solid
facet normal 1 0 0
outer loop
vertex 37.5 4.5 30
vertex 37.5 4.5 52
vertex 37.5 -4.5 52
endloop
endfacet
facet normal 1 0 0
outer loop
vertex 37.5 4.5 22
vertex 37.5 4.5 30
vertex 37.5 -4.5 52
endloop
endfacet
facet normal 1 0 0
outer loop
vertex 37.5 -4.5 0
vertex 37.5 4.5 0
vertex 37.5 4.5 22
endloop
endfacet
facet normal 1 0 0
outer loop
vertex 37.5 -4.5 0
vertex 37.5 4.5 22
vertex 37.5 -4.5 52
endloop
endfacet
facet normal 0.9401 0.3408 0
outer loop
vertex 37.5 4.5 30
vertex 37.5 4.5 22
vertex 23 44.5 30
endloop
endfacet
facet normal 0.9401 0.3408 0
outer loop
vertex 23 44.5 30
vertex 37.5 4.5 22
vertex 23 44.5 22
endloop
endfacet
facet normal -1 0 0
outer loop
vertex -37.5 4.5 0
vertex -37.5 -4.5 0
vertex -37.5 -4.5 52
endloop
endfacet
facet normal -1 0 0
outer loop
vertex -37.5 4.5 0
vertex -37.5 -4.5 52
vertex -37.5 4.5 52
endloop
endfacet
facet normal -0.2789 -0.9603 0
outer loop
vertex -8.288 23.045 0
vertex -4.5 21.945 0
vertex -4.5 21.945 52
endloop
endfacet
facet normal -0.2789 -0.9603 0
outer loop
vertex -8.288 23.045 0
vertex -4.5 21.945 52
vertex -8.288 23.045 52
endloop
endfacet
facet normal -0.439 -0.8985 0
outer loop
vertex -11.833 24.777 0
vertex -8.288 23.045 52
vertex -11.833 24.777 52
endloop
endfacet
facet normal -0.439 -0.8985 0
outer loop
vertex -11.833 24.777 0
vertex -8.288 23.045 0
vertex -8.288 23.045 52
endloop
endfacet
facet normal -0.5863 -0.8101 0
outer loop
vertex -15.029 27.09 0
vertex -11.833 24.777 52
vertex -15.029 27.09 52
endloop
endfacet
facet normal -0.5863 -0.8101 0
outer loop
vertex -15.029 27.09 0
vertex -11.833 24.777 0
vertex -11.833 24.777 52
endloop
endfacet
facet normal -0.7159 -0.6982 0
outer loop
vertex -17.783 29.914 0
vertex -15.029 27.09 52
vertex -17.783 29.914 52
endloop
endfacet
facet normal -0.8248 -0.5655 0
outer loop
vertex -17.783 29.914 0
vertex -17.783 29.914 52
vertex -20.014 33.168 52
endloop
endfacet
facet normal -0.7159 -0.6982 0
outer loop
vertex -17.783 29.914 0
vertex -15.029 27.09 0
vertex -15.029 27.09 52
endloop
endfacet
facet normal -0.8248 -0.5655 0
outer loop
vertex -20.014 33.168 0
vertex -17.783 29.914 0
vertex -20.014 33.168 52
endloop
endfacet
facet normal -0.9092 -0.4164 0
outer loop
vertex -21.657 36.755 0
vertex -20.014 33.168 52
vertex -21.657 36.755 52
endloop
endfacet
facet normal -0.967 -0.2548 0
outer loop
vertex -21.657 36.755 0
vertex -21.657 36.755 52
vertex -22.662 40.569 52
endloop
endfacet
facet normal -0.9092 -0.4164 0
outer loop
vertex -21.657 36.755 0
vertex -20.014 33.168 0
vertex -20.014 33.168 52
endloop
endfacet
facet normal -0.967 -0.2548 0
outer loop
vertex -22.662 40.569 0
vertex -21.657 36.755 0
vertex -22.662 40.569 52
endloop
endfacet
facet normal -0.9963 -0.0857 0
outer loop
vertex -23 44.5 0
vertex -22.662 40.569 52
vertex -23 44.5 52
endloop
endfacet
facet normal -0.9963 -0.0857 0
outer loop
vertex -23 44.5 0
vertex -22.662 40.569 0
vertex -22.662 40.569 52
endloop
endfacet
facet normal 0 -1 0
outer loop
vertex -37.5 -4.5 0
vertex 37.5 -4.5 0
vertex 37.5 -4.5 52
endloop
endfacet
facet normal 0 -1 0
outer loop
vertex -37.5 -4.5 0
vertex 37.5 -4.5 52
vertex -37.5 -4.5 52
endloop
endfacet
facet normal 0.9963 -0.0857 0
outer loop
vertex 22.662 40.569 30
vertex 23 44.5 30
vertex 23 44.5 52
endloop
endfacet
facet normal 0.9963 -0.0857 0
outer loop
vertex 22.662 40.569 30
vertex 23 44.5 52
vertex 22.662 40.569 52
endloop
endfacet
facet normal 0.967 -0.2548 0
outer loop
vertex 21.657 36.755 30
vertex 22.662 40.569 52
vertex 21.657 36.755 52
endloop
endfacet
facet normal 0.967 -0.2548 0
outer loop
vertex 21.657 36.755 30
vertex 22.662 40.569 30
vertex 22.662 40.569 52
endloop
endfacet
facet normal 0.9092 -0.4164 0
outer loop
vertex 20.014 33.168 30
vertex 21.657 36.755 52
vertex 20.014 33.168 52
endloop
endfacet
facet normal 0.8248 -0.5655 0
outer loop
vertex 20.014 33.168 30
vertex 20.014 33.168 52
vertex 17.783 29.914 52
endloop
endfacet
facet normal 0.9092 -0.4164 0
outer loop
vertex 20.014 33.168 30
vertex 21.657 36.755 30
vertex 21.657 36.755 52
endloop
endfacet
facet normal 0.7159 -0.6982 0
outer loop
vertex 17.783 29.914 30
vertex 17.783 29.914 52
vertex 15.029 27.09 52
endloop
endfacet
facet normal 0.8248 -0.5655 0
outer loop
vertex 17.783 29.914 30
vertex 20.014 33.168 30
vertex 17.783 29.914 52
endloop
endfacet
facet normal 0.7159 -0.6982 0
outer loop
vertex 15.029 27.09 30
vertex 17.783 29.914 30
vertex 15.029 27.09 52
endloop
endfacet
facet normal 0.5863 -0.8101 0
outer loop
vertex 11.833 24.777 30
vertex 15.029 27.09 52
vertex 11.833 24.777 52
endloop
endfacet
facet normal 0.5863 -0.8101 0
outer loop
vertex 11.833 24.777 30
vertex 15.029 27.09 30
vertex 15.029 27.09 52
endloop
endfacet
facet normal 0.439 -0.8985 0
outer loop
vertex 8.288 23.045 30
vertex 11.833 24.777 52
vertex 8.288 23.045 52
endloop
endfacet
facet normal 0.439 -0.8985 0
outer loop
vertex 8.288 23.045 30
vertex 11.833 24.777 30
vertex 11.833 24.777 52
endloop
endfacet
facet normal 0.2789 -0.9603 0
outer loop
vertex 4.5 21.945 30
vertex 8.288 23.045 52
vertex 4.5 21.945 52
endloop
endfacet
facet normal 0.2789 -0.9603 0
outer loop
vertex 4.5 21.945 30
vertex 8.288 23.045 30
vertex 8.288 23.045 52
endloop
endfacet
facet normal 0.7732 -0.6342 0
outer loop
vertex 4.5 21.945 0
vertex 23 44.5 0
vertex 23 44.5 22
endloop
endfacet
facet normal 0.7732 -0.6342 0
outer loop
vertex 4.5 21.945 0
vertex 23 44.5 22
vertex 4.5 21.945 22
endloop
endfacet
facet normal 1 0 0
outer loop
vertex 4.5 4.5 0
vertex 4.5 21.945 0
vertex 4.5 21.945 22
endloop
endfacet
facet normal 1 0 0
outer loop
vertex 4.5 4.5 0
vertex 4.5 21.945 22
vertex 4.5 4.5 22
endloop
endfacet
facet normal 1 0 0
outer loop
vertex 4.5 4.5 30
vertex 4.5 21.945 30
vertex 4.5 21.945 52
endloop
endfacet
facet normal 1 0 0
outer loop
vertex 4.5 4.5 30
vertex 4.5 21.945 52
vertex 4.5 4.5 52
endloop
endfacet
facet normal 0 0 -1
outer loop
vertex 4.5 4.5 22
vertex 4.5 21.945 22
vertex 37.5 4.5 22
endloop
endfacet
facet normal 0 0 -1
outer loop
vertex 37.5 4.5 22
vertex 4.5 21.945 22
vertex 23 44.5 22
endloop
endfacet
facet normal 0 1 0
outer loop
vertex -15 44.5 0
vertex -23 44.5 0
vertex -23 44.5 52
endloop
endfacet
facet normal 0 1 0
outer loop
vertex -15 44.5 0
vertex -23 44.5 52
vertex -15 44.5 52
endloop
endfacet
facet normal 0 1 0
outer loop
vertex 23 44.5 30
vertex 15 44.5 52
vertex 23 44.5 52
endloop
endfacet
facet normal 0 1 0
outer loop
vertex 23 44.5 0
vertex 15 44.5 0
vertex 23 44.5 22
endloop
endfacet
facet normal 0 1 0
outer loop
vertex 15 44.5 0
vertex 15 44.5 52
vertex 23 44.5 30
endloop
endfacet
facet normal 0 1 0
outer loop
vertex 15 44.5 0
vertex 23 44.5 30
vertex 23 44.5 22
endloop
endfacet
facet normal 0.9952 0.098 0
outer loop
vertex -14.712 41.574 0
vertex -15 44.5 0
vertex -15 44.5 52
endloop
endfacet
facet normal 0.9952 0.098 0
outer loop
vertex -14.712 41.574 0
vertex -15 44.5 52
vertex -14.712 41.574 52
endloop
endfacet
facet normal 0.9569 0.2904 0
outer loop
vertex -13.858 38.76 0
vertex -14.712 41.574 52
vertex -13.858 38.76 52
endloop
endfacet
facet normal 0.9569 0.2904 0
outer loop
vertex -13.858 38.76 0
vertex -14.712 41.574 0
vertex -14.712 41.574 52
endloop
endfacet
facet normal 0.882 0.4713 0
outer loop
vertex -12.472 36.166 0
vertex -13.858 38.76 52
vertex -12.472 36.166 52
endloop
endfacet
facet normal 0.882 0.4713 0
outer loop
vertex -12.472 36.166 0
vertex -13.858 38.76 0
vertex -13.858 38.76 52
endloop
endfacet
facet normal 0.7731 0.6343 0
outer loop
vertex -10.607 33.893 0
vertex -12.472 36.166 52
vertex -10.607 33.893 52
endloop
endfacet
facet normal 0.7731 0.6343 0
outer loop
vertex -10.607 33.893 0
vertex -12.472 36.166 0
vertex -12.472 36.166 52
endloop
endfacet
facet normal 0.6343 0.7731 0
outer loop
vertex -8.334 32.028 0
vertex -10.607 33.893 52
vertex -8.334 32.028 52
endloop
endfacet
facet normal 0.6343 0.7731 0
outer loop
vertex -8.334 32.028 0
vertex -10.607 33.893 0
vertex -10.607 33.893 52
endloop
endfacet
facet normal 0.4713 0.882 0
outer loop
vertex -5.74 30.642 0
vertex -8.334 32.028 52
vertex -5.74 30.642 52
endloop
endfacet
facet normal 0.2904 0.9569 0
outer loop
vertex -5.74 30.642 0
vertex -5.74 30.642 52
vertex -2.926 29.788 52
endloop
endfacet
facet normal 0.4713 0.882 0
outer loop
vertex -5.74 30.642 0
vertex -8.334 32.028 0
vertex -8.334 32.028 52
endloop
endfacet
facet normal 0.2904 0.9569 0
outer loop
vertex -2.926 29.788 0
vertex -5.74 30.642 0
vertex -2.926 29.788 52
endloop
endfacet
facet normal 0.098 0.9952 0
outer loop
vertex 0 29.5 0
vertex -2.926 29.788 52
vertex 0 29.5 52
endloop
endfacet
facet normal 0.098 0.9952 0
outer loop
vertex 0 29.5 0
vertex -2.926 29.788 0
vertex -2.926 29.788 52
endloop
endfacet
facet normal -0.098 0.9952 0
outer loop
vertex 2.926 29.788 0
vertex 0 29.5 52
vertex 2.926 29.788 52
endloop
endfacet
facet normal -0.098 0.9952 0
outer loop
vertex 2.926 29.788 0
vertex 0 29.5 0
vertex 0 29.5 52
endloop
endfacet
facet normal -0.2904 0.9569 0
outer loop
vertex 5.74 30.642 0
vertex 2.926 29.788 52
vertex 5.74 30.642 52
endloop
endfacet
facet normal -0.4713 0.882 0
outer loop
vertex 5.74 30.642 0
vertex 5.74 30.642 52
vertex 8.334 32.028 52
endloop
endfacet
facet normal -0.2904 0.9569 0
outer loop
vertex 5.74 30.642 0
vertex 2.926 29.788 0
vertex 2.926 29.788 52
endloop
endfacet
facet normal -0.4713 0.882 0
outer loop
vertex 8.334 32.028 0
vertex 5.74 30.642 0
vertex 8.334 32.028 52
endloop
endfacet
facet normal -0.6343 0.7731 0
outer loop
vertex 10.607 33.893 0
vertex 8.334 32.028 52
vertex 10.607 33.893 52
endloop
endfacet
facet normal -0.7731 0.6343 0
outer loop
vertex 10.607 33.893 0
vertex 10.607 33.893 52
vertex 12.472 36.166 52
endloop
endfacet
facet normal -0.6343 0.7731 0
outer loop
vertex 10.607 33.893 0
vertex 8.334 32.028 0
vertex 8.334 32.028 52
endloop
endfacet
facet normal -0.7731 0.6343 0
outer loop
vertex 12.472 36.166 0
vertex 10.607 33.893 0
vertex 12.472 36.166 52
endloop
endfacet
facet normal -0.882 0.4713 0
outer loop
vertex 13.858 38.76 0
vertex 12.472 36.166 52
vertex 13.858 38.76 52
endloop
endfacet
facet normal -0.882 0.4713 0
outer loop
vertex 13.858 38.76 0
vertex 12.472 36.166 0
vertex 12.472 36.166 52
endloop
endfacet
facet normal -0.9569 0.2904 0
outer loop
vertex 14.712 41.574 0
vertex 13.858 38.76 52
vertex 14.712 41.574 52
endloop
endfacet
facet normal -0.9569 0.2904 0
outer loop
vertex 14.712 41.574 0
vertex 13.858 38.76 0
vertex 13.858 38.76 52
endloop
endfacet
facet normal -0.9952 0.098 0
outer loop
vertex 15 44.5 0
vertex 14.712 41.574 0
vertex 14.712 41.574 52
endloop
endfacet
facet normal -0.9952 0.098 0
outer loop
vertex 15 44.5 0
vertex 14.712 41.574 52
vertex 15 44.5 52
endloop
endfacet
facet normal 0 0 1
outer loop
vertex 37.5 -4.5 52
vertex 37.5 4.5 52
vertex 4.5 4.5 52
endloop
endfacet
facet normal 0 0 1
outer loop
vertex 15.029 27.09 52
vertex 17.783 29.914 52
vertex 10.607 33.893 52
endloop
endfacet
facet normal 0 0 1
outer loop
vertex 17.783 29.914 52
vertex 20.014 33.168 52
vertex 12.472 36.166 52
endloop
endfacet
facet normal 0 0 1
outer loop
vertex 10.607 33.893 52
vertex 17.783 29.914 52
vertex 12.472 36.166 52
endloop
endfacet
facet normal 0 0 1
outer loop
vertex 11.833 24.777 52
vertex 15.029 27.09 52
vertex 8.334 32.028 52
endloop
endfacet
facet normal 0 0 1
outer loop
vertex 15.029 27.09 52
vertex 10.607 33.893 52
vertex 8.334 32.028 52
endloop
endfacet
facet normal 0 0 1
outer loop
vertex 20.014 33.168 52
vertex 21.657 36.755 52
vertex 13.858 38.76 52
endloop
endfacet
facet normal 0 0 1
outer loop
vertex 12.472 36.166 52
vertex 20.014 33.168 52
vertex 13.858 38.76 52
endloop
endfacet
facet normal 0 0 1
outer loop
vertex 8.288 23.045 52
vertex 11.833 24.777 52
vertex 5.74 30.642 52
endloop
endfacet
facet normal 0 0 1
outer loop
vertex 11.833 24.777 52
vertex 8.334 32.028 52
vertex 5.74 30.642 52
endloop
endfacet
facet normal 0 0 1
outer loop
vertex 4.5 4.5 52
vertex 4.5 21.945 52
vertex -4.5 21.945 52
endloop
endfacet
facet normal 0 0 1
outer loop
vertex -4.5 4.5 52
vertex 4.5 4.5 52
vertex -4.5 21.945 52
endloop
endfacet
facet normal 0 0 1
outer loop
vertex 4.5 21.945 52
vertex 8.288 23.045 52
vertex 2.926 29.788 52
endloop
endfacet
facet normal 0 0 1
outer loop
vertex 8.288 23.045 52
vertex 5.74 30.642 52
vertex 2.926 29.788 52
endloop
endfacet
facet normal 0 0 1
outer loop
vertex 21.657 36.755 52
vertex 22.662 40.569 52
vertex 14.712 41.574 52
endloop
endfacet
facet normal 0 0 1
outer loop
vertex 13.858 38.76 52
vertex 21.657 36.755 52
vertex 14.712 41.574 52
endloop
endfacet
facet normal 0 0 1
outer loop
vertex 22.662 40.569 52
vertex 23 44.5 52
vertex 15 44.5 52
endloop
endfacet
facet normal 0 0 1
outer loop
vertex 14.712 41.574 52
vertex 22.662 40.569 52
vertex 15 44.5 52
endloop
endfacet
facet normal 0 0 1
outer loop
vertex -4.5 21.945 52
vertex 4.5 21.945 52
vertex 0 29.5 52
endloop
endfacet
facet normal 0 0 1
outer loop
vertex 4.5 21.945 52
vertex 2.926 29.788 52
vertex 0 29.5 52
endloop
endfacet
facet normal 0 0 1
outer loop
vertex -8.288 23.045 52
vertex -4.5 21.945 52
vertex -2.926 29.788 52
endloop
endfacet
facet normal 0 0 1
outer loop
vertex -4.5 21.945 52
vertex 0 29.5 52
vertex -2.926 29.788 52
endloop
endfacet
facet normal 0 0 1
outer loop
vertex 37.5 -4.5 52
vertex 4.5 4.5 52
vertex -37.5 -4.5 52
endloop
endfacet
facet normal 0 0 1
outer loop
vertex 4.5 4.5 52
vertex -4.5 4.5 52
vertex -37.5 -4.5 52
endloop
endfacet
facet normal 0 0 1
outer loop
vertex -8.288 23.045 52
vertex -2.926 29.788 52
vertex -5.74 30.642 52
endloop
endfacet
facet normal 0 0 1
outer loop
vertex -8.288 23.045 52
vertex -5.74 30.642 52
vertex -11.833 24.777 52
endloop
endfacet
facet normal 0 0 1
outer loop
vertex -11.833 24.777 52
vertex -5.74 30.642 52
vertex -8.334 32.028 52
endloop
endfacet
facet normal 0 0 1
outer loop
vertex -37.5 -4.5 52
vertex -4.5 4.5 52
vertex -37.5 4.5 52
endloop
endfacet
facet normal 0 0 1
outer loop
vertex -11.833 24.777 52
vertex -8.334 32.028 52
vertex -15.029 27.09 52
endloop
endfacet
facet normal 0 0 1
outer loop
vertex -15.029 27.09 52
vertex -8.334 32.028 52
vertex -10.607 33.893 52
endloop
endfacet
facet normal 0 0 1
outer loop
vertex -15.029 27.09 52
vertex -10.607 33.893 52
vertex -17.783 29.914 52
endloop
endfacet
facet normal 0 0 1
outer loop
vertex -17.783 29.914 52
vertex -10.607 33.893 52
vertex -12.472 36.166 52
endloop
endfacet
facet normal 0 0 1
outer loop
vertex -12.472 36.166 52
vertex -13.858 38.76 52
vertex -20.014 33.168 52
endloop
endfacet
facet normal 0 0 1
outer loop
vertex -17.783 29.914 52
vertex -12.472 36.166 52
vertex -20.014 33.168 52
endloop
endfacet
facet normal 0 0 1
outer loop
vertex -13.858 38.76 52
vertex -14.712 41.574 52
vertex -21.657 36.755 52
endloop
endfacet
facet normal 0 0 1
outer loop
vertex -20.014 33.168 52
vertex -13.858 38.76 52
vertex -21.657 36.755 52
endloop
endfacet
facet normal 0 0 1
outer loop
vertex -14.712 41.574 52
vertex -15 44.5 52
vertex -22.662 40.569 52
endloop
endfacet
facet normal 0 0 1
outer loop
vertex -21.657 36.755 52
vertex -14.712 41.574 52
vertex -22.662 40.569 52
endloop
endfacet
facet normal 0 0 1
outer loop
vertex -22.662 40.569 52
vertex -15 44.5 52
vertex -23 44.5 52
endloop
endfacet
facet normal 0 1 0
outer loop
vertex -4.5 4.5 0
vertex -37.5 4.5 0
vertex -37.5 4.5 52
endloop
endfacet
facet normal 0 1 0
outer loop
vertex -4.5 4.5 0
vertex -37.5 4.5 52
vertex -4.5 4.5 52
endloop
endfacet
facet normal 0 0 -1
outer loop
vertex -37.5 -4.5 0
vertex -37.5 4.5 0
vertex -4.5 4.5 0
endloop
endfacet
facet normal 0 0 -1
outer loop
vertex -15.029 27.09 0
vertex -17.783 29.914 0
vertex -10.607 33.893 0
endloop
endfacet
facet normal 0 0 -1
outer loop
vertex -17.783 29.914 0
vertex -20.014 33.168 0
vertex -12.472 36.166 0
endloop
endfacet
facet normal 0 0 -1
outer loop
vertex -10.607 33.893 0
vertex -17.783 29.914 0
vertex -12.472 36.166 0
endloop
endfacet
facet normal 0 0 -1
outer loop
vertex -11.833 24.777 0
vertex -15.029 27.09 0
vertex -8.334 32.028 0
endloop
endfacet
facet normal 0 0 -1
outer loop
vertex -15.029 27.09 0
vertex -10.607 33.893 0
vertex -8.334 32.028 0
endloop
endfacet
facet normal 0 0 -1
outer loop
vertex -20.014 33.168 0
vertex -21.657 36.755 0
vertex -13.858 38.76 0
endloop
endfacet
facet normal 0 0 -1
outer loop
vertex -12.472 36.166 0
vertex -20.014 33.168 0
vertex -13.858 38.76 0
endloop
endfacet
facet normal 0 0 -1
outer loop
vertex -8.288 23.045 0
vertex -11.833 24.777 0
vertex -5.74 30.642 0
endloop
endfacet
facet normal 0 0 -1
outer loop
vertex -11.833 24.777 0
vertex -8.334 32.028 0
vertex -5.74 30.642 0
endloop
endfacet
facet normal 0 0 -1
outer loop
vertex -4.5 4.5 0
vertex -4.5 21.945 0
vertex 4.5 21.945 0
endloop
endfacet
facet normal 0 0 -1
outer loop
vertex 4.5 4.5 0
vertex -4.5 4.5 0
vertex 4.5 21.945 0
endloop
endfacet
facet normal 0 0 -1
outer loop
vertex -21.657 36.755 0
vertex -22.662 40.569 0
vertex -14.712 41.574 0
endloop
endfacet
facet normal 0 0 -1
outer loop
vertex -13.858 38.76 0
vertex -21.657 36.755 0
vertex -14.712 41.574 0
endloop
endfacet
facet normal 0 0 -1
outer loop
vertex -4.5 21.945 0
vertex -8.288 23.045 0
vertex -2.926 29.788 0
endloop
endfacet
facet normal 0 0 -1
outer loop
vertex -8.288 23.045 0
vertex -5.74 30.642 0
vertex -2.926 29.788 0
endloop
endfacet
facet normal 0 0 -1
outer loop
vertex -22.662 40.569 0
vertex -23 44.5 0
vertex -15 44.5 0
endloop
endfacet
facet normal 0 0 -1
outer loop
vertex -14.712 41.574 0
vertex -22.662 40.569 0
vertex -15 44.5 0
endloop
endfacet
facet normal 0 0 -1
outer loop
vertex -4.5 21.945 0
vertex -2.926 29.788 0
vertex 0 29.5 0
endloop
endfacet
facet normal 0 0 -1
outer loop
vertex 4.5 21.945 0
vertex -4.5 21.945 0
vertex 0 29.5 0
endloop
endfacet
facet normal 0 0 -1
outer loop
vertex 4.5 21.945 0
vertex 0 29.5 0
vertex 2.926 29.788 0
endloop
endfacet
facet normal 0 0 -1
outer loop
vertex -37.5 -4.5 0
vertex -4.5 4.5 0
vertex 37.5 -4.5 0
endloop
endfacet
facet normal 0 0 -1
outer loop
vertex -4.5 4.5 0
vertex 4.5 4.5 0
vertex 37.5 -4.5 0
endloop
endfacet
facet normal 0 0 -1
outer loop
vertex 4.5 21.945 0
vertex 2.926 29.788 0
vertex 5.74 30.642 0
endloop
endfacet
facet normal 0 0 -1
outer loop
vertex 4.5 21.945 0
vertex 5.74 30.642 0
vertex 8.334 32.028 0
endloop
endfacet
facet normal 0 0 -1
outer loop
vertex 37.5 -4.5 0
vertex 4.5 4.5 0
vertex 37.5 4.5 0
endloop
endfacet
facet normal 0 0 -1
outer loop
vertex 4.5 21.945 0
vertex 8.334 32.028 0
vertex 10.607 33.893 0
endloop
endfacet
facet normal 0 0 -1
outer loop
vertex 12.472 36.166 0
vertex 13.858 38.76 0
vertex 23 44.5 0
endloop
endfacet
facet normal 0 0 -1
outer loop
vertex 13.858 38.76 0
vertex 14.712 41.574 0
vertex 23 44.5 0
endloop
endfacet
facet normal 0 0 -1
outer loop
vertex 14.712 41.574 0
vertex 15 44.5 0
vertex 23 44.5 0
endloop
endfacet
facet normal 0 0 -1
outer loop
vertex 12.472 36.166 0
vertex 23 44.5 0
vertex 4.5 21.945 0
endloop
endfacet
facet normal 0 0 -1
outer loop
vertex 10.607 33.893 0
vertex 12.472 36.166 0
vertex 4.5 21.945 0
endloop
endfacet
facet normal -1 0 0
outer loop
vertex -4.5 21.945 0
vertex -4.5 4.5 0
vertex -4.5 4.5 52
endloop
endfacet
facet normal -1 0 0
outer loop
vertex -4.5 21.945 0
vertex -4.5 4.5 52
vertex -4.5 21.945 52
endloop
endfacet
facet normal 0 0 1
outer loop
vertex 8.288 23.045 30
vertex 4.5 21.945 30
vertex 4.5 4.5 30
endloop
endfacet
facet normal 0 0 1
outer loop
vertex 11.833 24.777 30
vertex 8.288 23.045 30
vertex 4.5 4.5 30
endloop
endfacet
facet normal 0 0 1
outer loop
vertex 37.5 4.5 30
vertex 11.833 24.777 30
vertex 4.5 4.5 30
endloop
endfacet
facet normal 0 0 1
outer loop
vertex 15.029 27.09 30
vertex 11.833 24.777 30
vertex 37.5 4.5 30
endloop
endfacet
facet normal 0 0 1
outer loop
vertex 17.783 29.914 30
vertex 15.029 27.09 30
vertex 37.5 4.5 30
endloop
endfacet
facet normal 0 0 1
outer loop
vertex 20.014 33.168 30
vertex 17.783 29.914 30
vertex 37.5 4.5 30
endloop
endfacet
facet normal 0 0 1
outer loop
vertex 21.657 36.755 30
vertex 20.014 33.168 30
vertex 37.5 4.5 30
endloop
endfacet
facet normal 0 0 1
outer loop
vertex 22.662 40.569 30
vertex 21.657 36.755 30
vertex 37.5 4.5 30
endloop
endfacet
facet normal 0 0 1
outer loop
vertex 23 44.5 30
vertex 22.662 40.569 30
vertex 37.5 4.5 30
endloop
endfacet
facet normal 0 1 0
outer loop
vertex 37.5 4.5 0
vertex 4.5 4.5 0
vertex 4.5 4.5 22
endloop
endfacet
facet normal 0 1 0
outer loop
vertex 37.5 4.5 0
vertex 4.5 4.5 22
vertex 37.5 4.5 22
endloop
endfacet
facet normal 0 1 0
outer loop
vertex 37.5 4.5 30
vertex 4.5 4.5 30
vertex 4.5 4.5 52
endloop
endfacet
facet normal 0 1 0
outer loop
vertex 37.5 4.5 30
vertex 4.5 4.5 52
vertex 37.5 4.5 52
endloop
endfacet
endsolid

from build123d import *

# Parameters (mm, degrees)
BOSS_EXTRUDE3_DEPTH = 52
BOSS_EXTRUDE4_DEPTH = 30
CUT_EXTRUDE1_DEPTH  = 22


with BuildPart() as part:
    # Sketch4 → Boss-Extrude3 (new body)
    with BuildSketch(Plane.XY):
        with BuildLine():
            Line((-37.5, 4.5), (-4.5, 4.5))
            Line((-4.5, 4.5), (-4.5, 21.944512863))
            ThreePointArc((-4.5, 21.944512863), (-17.783419244, 29.914047854), (-23, 44.5))
            Line((-23, 44.5), (-15, 44.5))
            ThreePointArc((-15, 44.5), (0, 29.5), (15, 44.5))
            Line((15, 44.5), (23, 44.5))
            ThreePointArc((23, 44.5), (17.783419244, 29.914047854), (4.5, 21.944512863))
            Line((4.5, 21.944512863), (4.5, 4.5))
            Line((4.5, 4.5), (37.5, 4.5))
            Line((37.5, 4.5), (37.5, -4.5))
            Line((37.5, -4.5), (-37.5, -4.5))
            Line((-37.5, -4.5), (-37.5, 4.5))
        make_face()
    extrude(amount=BOSS_EXTRUDE3_DEPTH)

    # Sketch5 → Boss-Extrude4 (add)
    with BuildSketch(Plane.XY):
        Polygon((4.5, 4.5), (37.5, 4.5), (23, 44.5), (4.5, 21.944512863), align=None)
    extrude(amount=BOSS_EXTRUDE4_DEPTH)

    # Sketch5<2> → Cut-Extrude1 (cut)
    with BuildSketch(Plane.XY):
        Polygon((4.5, 4.5), (37.5, 4.5), (23, 44.5), (4.5, 21.944512863), align=None)
    extrude(amount=CUT_EXTRUDE1_DEPTH, mode=Mode.SUBTRACT)


solid = part.part
